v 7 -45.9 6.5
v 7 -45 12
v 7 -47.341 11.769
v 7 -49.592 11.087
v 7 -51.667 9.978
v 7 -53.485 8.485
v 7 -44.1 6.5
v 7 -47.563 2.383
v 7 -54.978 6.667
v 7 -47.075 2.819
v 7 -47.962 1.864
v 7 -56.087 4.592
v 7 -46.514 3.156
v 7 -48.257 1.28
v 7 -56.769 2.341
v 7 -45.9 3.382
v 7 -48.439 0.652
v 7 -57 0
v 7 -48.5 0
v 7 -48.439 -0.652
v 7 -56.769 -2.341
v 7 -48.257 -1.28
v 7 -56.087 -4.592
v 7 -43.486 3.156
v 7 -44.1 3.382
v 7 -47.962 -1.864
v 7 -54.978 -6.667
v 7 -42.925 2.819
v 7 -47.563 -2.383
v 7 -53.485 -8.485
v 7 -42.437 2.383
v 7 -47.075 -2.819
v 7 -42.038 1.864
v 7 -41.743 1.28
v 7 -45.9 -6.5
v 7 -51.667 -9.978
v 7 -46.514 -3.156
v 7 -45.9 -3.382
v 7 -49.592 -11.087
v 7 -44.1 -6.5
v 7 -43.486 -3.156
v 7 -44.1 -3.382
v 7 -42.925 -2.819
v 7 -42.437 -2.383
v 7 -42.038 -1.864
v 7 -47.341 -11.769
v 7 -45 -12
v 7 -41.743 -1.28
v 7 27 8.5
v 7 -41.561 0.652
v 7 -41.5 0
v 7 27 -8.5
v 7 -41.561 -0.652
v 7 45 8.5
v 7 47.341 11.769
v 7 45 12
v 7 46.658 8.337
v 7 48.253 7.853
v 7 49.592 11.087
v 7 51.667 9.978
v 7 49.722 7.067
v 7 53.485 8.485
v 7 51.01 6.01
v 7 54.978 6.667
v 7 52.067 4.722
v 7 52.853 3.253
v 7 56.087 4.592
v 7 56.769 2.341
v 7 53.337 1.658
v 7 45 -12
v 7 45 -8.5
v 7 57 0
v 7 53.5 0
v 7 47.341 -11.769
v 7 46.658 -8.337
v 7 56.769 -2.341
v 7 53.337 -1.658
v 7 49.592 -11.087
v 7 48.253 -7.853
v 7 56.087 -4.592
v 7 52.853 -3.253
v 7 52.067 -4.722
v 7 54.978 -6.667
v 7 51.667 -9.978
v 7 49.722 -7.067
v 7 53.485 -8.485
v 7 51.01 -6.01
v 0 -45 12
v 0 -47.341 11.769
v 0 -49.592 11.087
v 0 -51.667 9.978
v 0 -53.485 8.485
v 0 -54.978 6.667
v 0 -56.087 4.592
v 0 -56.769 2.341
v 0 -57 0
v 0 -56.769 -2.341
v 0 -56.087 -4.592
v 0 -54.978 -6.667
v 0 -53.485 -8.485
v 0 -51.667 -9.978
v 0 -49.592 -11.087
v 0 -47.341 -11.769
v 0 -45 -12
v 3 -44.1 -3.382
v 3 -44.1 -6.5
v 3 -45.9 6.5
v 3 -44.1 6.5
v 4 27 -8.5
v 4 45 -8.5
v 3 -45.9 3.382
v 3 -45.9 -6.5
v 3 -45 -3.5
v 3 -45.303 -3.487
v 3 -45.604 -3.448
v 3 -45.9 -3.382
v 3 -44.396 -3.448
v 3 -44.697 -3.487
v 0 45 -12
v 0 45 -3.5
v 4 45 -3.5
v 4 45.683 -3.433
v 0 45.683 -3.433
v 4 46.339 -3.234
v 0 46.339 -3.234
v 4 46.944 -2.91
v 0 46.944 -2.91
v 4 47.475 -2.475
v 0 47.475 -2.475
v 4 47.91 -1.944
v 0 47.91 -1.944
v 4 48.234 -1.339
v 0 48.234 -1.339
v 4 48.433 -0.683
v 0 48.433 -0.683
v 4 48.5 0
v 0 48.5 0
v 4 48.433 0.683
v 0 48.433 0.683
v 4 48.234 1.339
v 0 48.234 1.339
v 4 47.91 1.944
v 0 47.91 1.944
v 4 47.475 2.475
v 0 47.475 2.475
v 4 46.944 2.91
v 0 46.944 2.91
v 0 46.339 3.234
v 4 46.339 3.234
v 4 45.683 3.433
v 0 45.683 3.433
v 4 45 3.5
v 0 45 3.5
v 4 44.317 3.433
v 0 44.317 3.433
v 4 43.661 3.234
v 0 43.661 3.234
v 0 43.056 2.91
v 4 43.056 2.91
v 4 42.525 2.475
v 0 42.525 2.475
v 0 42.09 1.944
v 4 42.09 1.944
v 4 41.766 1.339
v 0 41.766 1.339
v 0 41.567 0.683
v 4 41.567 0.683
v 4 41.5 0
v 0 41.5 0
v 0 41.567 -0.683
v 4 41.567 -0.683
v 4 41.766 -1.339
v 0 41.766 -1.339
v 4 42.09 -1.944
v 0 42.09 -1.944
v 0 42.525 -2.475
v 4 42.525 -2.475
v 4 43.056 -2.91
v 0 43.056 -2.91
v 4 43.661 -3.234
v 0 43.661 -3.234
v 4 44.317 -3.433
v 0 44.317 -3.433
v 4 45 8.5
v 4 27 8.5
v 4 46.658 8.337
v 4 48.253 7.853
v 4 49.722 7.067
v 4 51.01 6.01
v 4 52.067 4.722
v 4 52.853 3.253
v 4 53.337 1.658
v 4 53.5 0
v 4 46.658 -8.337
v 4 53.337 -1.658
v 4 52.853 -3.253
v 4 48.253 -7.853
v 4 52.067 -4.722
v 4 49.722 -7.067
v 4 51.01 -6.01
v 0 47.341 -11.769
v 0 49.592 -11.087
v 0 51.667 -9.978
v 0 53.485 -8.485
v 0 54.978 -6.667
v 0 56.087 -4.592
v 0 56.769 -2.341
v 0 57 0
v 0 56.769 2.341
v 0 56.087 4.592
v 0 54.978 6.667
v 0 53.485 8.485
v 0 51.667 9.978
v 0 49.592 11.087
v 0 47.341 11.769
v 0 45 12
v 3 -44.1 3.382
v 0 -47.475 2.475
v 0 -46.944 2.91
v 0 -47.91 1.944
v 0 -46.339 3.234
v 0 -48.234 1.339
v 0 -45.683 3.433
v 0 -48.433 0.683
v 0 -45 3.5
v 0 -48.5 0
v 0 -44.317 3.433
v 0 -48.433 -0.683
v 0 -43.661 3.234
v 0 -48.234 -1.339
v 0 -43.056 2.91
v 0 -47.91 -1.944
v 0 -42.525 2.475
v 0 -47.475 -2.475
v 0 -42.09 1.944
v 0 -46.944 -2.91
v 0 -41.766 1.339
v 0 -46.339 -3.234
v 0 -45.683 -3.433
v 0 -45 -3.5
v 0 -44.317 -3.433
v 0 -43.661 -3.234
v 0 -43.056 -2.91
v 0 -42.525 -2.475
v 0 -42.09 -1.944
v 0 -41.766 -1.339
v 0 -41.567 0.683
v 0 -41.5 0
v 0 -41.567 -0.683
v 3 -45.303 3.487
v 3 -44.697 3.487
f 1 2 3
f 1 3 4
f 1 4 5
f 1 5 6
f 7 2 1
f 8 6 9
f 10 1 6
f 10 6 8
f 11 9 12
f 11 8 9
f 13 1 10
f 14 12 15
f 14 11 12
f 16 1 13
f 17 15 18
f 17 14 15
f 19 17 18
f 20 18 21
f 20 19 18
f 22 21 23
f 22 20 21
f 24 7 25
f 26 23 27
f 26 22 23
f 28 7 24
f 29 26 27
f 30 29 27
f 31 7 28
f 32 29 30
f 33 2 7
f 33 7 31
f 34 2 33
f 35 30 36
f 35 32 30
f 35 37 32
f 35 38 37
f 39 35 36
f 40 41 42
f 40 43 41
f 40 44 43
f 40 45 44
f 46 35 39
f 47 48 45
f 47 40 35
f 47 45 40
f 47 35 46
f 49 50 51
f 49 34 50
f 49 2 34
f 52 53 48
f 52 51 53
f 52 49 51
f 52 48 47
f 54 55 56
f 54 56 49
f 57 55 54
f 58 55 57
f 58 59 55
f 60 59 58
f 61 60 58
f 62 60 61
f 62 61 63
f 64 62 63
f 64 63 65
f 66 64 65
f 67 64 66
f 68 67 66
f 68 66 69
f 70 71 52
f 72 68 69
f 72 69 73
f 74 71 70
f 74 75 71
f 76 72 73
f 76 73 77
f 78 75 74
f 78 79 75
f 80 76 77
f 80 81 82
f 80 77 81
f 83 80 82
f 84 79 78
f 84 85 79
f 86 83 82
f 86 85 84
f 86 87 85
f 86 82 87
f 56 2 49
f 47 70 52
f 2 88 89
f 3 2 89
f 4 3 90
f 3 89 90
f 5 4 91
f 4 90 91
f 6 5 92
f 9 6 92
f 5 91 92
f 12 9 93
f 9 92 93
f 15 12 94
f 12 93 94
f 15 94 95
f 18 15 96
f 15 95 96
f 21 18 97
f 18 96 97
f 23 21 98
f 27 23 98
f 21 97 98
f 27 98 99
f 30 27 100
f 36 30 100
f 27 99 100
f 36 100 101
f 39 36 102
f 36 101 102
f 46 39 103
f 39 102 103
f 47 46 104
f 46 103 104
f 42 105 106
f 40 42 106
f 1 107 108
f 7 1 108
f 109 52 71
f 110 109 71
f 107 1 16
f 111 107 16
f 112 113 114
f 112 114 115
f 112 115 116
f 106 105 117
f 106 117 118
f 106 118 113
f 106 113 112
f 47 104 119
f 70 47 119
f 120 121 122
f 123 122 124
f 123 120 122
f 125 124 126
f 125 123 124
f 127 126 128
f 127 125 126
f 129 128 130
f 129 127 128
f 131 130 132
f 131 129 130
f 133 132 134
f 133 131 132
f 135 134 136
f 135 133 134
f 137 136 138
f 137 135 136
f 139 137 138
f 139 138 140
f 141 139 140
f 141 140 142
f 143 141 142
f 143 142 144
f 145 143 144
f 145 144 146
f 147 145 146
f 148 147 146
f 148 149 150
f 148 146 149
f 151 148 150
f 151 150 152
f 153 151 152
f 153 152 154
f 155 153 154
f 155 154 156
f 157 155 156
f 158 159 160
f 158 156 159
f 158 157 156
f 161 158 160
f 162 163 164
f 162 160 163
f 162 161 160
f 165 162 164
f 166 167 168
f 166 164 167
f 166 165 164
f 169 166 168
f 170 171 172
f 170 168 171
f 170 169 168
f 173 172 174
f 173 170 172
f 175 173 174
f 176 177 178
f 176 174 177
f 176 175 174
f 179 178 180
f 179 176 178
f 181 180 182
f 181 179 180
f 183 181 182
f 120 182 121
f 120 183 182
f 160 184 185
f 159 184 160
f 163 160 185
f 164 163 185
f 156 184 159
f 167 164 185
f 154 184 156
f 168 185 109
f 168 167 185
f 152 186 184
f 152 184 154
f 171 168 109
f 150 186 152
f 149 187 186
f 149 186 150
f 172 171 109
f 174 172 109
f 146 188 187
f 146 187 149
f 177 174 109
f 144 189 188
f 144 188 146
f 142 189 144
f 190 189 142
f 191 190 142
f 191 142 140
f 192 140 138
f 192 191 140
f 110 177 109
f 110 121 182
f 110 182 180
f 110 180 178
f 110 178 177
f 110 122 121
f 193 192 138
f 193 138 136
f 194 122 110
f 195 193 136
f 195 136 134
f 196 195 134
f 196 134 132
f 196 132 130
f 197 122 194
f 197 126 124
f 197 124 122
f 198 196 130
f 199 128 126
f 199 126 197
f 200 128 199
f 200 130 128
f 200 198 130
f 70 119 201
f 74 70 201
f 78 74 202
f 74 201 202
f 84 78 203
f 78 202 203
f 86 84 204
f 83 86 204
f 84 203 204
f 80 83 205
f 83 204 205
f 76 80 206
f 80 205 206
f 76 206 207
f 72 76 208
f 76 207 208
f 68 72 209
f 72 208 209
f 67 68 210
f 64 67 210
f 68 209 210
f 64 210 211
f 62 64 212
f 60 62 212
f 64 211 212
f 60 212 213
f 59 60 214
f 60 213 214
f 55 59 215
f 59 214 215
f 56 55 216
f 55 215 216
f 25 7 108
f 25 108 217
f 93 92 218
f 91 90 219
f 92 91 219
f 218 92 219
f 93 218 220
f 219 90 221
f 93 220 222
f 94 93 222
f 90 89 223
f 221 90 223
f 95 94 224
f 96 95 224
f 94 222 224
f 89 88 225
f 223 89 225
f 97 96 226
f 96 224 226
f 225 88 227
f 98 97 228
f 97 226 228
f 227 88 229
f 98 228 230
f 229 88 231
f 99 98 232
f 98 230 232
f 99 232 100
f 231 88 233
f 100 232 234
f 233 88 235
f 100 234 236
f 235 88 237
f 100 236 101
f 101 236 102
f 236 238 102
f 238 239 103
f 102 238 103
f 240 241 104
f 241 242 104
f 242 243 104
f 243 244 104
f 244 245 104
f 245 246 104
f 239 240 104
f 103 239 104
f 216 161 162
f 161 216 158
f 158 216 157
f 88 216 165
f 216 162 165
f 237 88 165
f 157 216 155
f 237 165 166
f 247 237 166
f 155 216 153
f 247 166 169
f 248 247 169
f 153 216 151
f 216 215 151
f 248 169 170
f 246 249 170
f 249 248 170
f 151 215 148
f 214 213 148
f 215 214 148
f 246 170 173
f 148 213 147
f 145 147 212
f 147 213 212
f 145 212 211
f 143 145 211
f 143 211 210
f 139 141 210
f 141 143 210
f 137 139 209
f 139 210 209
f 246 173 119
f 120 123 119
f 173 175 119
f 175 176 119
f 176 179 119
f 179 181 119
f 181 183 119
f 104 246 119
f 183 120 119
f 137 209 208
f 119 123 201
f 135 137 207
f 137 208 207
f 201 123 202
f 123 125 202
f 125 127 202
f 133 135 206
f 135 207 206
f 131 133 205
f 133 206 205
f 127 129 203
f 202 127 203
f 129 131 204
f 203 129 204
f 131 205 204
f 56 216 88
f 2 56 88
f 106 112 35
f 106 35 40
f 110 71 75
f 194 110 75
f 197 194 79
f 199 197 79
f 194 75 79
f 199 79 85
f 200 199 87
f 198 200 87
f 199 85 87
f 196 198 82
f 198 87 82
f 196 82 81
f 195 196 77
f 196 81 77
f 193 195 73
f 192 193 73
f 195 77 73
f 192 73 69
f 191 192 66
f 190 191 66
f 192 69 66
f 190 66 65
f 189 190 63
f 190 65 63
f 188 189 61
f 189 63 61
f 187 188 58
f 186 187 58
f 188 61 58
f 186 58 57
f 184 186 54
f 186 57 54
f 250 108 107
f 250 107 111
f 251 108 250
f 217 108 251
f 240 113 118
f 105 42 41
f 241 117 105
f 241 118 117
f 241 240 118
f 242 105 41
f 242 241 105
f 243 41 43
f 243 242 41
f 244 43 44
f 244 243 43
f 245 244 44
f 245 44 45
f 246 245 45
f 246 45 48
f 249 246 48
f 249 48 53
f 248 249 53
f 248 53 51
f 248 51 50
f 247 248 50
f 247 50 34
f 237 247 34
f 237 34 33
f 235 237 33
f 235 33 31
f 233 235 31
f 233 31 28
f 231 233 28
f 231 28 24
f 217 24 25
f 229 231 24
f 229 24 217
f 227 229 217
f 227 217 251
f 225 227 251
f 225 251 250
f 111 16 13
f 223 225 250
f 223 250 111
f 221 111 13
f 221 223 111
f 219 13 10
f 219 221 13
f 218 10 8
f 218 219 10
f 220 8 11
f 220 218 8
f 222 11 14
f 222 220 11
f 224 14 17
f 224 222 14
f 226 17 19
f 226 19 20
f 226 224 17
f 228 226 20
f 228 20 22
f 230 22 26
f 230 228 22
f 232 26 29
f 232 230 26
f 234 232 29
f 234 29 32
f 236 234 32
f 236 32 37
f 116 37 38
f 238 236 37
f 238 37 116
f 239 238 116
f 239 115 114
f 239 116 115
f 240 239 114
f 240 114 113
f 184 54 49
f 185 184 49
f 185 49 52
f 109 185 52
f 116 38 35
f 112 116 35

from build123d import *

# Parameters (mm, degrees)
SKETCH1_R           = 3.5
BOSS_EXTRUDE1_DEPTH = 7
CUT_EXTRUDE1_DEPTH  = 3
SKETCH3_W           = 13
SKETCH3_H           = 1.8
CUT_EXTRUDE2_DEPTH  = 4


with BuildPart() as part:
    # Sketch1 → Boss-Extrude1 (new body)
    with BuildSketch(Plane(origin=(0, 0, 0), x_dir=(0, 0, -1), z_dir=(1, 0, 0))):
        with BuildLine():
            Line((-12, 45), (-12, -45))
            ThreePointArc((-12, -45), (0, -57), (12, -45))
            Line((12, -45), (12, 45))
            ThreePointArc((12, 45), (0, 57), (-12, 45))
        make_face()
        with Locations((0, 45)):
            Circle(SKETCH1_R, mode=Mode.SUBTRACT)
        with Locations((0, -45)):
            Circle(SKETCH1_R, mode=Mode.SUBTRACT)
    extrude(amount=BOSS_EXTRUDE1_DEPTH)

    # Sketch2 → Cut-Extrude1 (cut)
    with BuildSketch(Plane(origin=(7, 0, 0), x_dir=(0, 0, -1), z_dir=(1, 0, 0))):
        with BuildLine():
            Line((-8.5, 45), (-8.5, 27))
            Line((-8.5, 27), (8.5, 27))
            Line((8.5, 27), (8.5, 45))
            ThreePointArc((8.5, 45), (0, 53.5), (-8.5, 45))
        make_face()
    extrude(amount=-CUT_EXTRUDE1_DEPTH, mode=Mode.SUBTRACT)

    # Sketch3 → Cut-Extrude2 (cut)
    with BuildSketch(Plane(origin=(7, 0, 0), x_dir=(0, 0, -1), z_dir=(1, 0, 0))):
        with Locations((0, -45)):
            Rectangle(SKETCH3_W, SKETCH3_H)
    extrude(amount=-CUT_EXTRUDE2_DEPTH, mode=Mode.SUBTRACT)


solid = part.part
